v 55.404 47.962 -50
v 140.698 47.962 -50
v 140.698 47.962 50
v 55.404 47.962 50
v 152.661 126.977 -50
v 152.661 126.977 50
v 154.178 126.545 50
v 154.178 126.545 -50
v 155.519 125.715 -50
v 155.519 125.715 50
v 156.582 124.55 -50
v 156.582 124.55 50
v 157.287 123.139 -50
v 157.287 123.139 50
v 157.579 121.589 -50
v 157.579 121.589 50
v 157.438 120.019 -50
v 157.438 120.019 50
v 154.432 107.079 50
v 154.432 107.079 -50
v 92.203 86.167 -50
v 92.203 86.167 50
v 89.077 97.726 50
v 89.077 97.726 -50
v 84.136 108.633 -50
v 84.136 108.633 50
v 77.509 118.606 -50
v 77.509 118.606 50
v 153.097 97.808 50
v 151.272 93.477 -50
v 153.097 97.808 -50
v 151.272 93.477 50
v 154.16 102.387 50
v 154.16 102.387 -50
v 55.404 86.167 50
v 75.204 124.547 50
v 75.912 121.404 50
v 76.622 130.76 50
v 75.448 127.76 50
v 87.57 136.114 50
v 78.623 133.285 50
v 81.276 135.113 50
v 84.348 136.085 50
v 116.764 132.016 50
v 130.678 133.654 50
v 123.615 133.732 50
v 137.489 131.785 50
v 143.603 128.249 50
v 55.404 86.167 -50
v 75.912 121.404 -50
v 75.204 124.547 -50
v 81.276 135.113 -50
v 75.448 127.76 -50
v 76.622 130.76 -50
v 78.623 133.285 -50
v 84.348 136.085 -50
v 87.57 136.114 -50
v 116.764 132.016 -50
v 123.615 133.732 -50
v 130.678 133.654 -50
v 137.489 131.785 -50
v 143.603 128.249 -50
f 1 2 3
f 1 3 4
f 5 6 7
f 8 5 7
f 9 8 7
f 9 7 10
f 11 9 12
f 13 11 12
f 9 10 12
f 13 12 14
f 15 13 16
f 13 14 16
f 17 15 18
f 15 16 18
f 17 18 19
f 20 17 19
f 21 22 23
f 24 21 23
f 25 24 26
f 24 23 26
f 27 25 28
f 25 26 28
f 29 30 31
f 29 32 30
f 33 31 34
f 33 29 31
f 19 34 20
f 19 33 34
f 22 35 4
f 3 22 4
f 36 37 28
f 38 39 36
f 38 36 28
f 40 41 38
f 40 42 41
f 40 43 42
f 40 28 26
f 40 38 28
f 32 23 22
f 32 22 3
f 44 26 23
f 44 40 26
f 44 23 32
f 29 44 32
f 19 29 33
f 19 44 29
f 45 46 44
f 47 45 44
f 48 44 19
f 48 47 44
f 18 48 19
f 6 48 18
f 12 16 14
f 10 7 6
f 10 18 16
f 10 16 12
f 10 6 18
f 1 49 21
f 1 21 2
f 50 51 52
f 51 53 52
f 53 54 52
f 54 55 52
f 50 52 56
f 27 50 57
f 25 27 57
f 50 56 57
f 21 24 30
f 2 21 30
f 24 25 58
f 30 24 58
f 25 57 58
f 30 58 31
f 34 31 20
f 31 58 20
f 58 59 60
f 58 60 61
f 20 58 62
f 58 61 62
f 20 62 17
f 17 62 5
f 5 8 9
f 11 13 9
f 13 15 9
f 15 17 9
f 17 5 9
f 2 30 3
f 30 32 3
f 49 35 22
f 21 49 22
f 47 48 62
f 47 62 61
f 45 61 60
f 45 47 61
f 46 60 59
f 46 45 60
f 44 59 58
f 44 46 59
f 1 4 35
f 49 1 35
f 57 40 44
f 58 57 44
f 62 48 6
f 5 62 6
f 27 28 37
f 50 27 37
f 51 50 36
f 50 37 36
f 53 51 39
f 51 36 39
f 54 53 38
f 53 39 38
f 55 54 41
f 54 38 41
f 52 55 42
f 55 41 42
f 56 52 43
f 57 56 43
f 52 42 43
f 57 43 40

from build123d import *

# Parameters (mm, degrees)
SKETCH_1_R                     = 27.60110162
EXTRUDE_1_DEPTH                = 50
SPLIT_BODIES_1_SURFACE_1_BACK  = 232.061
SPLIT_BODIES_1_SURFACE_1_DEPTH = 464.122
SPLIT_BODIES_1_SURFACE_2_BACK  = 232.061
SPLIT_BODIES_1_SURFACE_2_DEPTH = 464.122


with BuildPart() as part:
    # 草图1 → 凸台-拉伸1 (new, symmetric)
    with BuildSketch(Plane.XY):
        with Locations((126.841, 106.3205)):
            Circle(SKETCH_1_R)
        with BuildLine():
            Line((0, 29.556947787), (33.841128496, 29.556947787))
            Line((33.841128496, 29.556947787), (55.404404979, 43.133825573))
            Line((55.404404979, 43.133825573), (55.404404979, 86.167316842))
            Line((55.404404979, 86.167316842), (92.202864513, 86.167316842))
            ThreePointArc((92.202864513, 86.167316842), (86.826289789, 103.279036613), (77.508707697, 118.605522617))
            ThreePointArc((77.508707697, 118.605522617), (76.622434757, 130.759815978), (87.569736188, 136.114152372))
            Line((87.569736188, 136.114152372), (152.661112554, 126.977376967))
            ThreePointArc((152.661112554, 126.977376967), (156.581939246, 124.549931981), (157.437634447, 120.018579331))
            Line((157.437634447, 120.018579331), (140.698476255, 47.962391292))
            Line((140.698476255, 47.962391292), (125.156200351, 47.962391292))
            Line((125.156200351, 47.962391292), (116.770080258, 26.493923855))
            Line((116.770080258, 26.493923855), (133.542320443, 26.493923855))
            Line((133.542320443, 26.493923855), (144.001, 0))
            Line((144.001, 0), (0, 0))
            Line((0, 0), (0, 29.556947787))
        make_face()
    extrude(amount=EXTRUDE_1_DEPTH, both=True)


with BuildPart() as body_2:
    # Split Bodies 1: the piece behind the surface
    add(part.part)
    # Split Bodies 1 surface: a surface, the sketch's curves swept straight by 464.122 mm
    with BuildLine(Plane.XY.offset(50).offset(-SPLIT_BODIES_1_SURFACE_1_BACK), mode=Mode.PRIVATE) as split_bodies_1_surface_1_path:
        Line((125.156200351, 47.962391292), (37.921543342, 47.962391292))
    split_bodies_1_surface_1 = Shell.extrude(split_bodies_1_surface_1_path.wire(), (0 * SPLIT_BODIES_1_SURFACE_1_DEPTH, 0 * SPLIT_BODIES_1_SURFACE_1_DEPTH, 1 * SPLIT_BODIES_1_SURFACE_1_DEPTH))
    split(bisect_by=split_bodies_1_surface_1, keep=Keep.BOTTOM)


with BuildPart() as part_1:
    add(part.part)

    # Split Bodies 1: split by a surface, the side it looks to stays
    # Split Bodies 1 surface: a surface, the sketch's curves swept straight by 464.122 mm
    with BuildLine(Plane.XY.offset(50).offset(-SPLIT_BODIES_1_SURFACE_2_BACK), mode=Mode.PRIVATE) as split_bodies_1_surface_2_path:
        Line((125.156200351, 47.962391292), (37.921543342, 47.962391292))
    split_bodies_1_surface_2 = Shell.extrude(split_bodies_1_surface_2_path.wire(), (0 * SPLIT_BODIES_1_SURFACE_2_DEPTH, 0 * SPLIT_BODIES_1_SURFACE_2_DEPTH, 1 * SPLIT_BODIES_1_SURFACE_2_DEPTH))
    split(bisect_by=split_bodies_1_surface_2, keep=Keep.TOP)


solid = body_2.part
